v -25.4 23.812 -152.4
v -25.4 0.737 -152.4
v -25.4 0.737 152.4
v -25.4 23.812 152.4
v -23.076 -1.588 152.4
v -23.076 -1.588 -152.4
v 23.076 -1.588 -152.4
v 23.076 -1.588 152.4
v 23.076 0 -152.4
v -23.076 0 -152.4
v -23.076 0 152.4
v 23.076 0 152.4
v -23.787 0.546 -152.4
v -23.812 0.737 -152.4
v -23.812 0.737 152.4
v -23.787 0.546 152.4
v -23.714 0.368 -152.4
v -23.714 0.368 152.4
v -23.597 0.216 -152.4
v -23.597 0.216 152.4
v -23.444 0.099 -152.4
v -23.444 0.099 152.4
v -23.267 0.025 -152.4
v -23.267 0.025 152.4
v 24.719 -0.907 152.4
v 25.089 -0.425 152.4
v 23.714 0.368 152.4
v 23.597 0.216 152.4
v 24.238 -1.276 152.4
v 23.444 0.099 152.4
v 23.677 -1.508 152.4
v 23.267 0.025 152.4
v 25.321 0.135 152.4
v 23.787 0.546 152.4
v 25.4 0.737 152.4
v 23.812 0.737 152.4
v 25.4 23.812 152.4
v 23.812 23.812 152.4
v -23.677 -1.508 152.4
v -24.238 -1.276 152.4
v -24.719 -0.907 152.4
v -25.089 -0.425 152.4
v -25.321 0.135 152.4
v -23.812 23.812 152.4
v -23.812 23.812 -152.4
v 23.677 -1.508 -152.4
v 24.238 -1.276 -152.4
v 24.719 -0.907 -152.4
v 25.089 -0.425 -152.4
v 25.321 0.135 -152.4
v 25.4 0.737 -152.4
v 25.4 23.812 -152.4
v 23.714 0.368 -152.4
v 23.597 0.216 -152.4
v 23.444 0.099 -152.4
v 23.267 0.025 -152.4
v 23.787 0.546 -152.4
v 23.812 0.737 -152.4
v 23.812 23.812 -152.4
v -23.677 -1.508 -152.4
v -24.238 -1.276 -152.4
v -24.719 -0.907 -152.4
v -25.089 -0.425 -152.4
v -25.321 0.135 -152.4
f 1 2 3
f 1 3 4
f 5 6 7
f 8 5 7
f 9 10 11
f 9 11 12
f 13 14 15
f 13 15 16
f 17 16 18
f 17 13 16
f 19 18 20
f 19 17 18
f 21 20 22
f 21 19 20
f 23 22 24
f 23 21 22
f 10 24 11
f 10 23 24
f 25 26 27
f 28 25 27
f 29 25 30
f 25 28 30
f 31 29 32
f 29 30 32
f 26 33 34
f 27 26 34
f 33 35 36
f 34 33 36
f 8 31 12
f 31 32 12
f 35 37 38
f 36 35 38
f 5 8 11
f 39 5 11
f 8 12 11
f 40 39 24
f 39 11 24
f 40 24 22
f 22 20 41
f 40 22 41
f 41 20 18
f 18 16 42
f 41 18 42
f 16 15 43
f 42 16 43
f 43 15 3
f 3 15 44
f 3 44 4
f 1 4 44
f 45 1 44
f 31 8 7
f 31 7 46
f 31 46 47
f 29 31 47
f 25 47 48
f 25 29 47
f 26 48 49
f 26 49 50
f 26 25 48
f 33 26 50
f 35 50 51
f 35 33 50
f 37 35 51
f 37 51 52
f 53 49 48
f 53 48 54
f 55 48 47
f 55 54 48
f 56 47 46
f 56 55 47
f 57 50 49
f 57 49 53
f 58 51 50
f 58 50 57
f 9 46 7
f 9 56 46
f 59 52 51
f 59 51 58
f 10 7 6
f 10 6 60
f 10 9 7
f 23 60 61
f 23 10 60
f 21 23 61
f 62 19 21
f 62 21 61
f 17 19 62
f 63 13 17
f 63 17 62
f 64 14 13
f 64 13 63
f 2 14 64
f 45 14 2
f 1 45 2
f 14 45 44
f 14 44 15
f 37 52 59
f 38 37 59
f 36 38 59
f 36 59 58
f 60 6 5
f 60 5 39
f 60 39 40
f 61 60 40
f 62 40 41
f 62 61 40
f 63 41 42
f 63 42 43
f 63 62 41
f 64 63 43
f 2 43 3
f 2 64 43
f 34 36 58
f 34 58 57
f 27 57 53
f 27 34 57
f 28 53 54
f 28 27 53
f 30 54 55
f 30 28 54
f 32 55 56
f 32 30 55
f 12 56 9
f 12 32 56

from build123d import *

# Parameters (mm, degrees)
SKETCH1_W                    = 50.8
SKETCH1_H                    = 304.8
BASE_FLANGE1_DEPTH           = 1.5875
EDGE_FLANGE1_STRIP_W         = 7.8232
EDGE_FLANGE1_STRIP_H         = 1.5875
EDGE_FLANGE1_STRIP_CUT_DEPTH = 304.8
EDGE_FLANGE1_DEPTH           = 304.8
EDGE_FLANGE2_STRIP_W         = 7.8232
EDGE_FLANGE2_STRIP_H         = 1.5875
EDGE_FLANGE2_STRIP_CUT_DEPTH = 304.8
EDGE_FLANGE2_DEPTH           = 304.8


# Sheet-metal steps are written as plain solids
with BuildPart() as part:
    # Sketch1 → Base-Flange1 (new body)
    with BuildSketch(Plane(origin=(0, 0, 0), x_dir=(1, 0, 0), z_dir=(0, 1, 0))):
        Rectangle(SKETCH1_W, SKETCH1_H)
    extrude(amount=-BASE_FLANGE1_DEPTH)

    # Edge-Flange1 strip (across the edge) → Edge-Flange1 strip cut (cut)
    with BuildSketch(Plane(origin=(25.4, 0, 152.4), x_dir=(-1, 0, 0), z_dir=(0, 0, -1))):
        with Locations((-1.5875, -0.79375)):
            Rectangle(EDGE_FLANGE1_STRIP_W, EDGE_FLANGE1_STRIP_H)
    extrude(amount=EDGE_FLANGE1_STRIP_CUT_DEPTH, mode=Mode.SUBTRACT)

    # Edge-Flange1 section (across the edge) → Edge-Flange1 (add)
    with BuildSketch(Plane(origin=(25.4, 0, 152.4), x_dir=(-1, 0, 0), z_dir=(0, 0, -1))):
        with BuildLine():
            Line((0, 0.7366), (0, 23.8125))
            Line((0, 23.8125), (1.5875, 23.8125))
            Line((1.5875, 23.8125), (1.5875, 0.7366))
            ThreePointArc((1.5875, 0.7366), (1.803245145, 0.215745145), (2.3241, 0))
            Line((2.3241, 0), (2.3241, -1.5875))
            ThreePointArc((2.3241, -1.5875), (0.68071313, -0.90678687), (0, 0.7366))
        make_face()
    extrude(amount=EDGE_FLANGE1_DEPTH)

    # Edge-Flange2 strip (across the edge) → Edge-Flange2 strip cut (cut)
    with BuildSketch(Plane(origin=(-25.4, 0, -152.4), x_dir=(1, 0, 0), z_dir=(0, 0, 1))):
        with Locations((-1.5875, -0.79375)):
            Rectangle(EDGE_FLANGE2_STRIP_W, EDGE_FLANGE2_STRIP_H)
    extrude(amount=EDGE_FLANGE2_STRIP_CUT_DEPTH, mode=Mode.SUBTRACT)

    # Edge-Flange2 section (across the edge) → Edge-Flange2 (add)
    with BuildSketch(Plane(origin=(-25.4, 0, -152.4), x_dir=(1, 0, 0), z_dir=(0, 0, 1))):
        with BuildLine():
            Line((0, 0.7366), (0, 23.8125))
            Line((0, 23.8125), (1.5875, 23.8125))
            Line((1.5875, 23.8125), (1.5875, 0.7366))
            ThreePointArc((1.5875, 0.7366), (1.803245145, 0.215745145), (2.3241, 0))
            Line((2.3241, 0), (2.3241, -1.5875))
            ThreePointArc((2.3241, -1.5875), (0.68071313, -0.90678687), (0, 0.7366))
        make_face()
    extrude(amount=EDGE_FLANGE2_DEPTH)


solid = part.part
